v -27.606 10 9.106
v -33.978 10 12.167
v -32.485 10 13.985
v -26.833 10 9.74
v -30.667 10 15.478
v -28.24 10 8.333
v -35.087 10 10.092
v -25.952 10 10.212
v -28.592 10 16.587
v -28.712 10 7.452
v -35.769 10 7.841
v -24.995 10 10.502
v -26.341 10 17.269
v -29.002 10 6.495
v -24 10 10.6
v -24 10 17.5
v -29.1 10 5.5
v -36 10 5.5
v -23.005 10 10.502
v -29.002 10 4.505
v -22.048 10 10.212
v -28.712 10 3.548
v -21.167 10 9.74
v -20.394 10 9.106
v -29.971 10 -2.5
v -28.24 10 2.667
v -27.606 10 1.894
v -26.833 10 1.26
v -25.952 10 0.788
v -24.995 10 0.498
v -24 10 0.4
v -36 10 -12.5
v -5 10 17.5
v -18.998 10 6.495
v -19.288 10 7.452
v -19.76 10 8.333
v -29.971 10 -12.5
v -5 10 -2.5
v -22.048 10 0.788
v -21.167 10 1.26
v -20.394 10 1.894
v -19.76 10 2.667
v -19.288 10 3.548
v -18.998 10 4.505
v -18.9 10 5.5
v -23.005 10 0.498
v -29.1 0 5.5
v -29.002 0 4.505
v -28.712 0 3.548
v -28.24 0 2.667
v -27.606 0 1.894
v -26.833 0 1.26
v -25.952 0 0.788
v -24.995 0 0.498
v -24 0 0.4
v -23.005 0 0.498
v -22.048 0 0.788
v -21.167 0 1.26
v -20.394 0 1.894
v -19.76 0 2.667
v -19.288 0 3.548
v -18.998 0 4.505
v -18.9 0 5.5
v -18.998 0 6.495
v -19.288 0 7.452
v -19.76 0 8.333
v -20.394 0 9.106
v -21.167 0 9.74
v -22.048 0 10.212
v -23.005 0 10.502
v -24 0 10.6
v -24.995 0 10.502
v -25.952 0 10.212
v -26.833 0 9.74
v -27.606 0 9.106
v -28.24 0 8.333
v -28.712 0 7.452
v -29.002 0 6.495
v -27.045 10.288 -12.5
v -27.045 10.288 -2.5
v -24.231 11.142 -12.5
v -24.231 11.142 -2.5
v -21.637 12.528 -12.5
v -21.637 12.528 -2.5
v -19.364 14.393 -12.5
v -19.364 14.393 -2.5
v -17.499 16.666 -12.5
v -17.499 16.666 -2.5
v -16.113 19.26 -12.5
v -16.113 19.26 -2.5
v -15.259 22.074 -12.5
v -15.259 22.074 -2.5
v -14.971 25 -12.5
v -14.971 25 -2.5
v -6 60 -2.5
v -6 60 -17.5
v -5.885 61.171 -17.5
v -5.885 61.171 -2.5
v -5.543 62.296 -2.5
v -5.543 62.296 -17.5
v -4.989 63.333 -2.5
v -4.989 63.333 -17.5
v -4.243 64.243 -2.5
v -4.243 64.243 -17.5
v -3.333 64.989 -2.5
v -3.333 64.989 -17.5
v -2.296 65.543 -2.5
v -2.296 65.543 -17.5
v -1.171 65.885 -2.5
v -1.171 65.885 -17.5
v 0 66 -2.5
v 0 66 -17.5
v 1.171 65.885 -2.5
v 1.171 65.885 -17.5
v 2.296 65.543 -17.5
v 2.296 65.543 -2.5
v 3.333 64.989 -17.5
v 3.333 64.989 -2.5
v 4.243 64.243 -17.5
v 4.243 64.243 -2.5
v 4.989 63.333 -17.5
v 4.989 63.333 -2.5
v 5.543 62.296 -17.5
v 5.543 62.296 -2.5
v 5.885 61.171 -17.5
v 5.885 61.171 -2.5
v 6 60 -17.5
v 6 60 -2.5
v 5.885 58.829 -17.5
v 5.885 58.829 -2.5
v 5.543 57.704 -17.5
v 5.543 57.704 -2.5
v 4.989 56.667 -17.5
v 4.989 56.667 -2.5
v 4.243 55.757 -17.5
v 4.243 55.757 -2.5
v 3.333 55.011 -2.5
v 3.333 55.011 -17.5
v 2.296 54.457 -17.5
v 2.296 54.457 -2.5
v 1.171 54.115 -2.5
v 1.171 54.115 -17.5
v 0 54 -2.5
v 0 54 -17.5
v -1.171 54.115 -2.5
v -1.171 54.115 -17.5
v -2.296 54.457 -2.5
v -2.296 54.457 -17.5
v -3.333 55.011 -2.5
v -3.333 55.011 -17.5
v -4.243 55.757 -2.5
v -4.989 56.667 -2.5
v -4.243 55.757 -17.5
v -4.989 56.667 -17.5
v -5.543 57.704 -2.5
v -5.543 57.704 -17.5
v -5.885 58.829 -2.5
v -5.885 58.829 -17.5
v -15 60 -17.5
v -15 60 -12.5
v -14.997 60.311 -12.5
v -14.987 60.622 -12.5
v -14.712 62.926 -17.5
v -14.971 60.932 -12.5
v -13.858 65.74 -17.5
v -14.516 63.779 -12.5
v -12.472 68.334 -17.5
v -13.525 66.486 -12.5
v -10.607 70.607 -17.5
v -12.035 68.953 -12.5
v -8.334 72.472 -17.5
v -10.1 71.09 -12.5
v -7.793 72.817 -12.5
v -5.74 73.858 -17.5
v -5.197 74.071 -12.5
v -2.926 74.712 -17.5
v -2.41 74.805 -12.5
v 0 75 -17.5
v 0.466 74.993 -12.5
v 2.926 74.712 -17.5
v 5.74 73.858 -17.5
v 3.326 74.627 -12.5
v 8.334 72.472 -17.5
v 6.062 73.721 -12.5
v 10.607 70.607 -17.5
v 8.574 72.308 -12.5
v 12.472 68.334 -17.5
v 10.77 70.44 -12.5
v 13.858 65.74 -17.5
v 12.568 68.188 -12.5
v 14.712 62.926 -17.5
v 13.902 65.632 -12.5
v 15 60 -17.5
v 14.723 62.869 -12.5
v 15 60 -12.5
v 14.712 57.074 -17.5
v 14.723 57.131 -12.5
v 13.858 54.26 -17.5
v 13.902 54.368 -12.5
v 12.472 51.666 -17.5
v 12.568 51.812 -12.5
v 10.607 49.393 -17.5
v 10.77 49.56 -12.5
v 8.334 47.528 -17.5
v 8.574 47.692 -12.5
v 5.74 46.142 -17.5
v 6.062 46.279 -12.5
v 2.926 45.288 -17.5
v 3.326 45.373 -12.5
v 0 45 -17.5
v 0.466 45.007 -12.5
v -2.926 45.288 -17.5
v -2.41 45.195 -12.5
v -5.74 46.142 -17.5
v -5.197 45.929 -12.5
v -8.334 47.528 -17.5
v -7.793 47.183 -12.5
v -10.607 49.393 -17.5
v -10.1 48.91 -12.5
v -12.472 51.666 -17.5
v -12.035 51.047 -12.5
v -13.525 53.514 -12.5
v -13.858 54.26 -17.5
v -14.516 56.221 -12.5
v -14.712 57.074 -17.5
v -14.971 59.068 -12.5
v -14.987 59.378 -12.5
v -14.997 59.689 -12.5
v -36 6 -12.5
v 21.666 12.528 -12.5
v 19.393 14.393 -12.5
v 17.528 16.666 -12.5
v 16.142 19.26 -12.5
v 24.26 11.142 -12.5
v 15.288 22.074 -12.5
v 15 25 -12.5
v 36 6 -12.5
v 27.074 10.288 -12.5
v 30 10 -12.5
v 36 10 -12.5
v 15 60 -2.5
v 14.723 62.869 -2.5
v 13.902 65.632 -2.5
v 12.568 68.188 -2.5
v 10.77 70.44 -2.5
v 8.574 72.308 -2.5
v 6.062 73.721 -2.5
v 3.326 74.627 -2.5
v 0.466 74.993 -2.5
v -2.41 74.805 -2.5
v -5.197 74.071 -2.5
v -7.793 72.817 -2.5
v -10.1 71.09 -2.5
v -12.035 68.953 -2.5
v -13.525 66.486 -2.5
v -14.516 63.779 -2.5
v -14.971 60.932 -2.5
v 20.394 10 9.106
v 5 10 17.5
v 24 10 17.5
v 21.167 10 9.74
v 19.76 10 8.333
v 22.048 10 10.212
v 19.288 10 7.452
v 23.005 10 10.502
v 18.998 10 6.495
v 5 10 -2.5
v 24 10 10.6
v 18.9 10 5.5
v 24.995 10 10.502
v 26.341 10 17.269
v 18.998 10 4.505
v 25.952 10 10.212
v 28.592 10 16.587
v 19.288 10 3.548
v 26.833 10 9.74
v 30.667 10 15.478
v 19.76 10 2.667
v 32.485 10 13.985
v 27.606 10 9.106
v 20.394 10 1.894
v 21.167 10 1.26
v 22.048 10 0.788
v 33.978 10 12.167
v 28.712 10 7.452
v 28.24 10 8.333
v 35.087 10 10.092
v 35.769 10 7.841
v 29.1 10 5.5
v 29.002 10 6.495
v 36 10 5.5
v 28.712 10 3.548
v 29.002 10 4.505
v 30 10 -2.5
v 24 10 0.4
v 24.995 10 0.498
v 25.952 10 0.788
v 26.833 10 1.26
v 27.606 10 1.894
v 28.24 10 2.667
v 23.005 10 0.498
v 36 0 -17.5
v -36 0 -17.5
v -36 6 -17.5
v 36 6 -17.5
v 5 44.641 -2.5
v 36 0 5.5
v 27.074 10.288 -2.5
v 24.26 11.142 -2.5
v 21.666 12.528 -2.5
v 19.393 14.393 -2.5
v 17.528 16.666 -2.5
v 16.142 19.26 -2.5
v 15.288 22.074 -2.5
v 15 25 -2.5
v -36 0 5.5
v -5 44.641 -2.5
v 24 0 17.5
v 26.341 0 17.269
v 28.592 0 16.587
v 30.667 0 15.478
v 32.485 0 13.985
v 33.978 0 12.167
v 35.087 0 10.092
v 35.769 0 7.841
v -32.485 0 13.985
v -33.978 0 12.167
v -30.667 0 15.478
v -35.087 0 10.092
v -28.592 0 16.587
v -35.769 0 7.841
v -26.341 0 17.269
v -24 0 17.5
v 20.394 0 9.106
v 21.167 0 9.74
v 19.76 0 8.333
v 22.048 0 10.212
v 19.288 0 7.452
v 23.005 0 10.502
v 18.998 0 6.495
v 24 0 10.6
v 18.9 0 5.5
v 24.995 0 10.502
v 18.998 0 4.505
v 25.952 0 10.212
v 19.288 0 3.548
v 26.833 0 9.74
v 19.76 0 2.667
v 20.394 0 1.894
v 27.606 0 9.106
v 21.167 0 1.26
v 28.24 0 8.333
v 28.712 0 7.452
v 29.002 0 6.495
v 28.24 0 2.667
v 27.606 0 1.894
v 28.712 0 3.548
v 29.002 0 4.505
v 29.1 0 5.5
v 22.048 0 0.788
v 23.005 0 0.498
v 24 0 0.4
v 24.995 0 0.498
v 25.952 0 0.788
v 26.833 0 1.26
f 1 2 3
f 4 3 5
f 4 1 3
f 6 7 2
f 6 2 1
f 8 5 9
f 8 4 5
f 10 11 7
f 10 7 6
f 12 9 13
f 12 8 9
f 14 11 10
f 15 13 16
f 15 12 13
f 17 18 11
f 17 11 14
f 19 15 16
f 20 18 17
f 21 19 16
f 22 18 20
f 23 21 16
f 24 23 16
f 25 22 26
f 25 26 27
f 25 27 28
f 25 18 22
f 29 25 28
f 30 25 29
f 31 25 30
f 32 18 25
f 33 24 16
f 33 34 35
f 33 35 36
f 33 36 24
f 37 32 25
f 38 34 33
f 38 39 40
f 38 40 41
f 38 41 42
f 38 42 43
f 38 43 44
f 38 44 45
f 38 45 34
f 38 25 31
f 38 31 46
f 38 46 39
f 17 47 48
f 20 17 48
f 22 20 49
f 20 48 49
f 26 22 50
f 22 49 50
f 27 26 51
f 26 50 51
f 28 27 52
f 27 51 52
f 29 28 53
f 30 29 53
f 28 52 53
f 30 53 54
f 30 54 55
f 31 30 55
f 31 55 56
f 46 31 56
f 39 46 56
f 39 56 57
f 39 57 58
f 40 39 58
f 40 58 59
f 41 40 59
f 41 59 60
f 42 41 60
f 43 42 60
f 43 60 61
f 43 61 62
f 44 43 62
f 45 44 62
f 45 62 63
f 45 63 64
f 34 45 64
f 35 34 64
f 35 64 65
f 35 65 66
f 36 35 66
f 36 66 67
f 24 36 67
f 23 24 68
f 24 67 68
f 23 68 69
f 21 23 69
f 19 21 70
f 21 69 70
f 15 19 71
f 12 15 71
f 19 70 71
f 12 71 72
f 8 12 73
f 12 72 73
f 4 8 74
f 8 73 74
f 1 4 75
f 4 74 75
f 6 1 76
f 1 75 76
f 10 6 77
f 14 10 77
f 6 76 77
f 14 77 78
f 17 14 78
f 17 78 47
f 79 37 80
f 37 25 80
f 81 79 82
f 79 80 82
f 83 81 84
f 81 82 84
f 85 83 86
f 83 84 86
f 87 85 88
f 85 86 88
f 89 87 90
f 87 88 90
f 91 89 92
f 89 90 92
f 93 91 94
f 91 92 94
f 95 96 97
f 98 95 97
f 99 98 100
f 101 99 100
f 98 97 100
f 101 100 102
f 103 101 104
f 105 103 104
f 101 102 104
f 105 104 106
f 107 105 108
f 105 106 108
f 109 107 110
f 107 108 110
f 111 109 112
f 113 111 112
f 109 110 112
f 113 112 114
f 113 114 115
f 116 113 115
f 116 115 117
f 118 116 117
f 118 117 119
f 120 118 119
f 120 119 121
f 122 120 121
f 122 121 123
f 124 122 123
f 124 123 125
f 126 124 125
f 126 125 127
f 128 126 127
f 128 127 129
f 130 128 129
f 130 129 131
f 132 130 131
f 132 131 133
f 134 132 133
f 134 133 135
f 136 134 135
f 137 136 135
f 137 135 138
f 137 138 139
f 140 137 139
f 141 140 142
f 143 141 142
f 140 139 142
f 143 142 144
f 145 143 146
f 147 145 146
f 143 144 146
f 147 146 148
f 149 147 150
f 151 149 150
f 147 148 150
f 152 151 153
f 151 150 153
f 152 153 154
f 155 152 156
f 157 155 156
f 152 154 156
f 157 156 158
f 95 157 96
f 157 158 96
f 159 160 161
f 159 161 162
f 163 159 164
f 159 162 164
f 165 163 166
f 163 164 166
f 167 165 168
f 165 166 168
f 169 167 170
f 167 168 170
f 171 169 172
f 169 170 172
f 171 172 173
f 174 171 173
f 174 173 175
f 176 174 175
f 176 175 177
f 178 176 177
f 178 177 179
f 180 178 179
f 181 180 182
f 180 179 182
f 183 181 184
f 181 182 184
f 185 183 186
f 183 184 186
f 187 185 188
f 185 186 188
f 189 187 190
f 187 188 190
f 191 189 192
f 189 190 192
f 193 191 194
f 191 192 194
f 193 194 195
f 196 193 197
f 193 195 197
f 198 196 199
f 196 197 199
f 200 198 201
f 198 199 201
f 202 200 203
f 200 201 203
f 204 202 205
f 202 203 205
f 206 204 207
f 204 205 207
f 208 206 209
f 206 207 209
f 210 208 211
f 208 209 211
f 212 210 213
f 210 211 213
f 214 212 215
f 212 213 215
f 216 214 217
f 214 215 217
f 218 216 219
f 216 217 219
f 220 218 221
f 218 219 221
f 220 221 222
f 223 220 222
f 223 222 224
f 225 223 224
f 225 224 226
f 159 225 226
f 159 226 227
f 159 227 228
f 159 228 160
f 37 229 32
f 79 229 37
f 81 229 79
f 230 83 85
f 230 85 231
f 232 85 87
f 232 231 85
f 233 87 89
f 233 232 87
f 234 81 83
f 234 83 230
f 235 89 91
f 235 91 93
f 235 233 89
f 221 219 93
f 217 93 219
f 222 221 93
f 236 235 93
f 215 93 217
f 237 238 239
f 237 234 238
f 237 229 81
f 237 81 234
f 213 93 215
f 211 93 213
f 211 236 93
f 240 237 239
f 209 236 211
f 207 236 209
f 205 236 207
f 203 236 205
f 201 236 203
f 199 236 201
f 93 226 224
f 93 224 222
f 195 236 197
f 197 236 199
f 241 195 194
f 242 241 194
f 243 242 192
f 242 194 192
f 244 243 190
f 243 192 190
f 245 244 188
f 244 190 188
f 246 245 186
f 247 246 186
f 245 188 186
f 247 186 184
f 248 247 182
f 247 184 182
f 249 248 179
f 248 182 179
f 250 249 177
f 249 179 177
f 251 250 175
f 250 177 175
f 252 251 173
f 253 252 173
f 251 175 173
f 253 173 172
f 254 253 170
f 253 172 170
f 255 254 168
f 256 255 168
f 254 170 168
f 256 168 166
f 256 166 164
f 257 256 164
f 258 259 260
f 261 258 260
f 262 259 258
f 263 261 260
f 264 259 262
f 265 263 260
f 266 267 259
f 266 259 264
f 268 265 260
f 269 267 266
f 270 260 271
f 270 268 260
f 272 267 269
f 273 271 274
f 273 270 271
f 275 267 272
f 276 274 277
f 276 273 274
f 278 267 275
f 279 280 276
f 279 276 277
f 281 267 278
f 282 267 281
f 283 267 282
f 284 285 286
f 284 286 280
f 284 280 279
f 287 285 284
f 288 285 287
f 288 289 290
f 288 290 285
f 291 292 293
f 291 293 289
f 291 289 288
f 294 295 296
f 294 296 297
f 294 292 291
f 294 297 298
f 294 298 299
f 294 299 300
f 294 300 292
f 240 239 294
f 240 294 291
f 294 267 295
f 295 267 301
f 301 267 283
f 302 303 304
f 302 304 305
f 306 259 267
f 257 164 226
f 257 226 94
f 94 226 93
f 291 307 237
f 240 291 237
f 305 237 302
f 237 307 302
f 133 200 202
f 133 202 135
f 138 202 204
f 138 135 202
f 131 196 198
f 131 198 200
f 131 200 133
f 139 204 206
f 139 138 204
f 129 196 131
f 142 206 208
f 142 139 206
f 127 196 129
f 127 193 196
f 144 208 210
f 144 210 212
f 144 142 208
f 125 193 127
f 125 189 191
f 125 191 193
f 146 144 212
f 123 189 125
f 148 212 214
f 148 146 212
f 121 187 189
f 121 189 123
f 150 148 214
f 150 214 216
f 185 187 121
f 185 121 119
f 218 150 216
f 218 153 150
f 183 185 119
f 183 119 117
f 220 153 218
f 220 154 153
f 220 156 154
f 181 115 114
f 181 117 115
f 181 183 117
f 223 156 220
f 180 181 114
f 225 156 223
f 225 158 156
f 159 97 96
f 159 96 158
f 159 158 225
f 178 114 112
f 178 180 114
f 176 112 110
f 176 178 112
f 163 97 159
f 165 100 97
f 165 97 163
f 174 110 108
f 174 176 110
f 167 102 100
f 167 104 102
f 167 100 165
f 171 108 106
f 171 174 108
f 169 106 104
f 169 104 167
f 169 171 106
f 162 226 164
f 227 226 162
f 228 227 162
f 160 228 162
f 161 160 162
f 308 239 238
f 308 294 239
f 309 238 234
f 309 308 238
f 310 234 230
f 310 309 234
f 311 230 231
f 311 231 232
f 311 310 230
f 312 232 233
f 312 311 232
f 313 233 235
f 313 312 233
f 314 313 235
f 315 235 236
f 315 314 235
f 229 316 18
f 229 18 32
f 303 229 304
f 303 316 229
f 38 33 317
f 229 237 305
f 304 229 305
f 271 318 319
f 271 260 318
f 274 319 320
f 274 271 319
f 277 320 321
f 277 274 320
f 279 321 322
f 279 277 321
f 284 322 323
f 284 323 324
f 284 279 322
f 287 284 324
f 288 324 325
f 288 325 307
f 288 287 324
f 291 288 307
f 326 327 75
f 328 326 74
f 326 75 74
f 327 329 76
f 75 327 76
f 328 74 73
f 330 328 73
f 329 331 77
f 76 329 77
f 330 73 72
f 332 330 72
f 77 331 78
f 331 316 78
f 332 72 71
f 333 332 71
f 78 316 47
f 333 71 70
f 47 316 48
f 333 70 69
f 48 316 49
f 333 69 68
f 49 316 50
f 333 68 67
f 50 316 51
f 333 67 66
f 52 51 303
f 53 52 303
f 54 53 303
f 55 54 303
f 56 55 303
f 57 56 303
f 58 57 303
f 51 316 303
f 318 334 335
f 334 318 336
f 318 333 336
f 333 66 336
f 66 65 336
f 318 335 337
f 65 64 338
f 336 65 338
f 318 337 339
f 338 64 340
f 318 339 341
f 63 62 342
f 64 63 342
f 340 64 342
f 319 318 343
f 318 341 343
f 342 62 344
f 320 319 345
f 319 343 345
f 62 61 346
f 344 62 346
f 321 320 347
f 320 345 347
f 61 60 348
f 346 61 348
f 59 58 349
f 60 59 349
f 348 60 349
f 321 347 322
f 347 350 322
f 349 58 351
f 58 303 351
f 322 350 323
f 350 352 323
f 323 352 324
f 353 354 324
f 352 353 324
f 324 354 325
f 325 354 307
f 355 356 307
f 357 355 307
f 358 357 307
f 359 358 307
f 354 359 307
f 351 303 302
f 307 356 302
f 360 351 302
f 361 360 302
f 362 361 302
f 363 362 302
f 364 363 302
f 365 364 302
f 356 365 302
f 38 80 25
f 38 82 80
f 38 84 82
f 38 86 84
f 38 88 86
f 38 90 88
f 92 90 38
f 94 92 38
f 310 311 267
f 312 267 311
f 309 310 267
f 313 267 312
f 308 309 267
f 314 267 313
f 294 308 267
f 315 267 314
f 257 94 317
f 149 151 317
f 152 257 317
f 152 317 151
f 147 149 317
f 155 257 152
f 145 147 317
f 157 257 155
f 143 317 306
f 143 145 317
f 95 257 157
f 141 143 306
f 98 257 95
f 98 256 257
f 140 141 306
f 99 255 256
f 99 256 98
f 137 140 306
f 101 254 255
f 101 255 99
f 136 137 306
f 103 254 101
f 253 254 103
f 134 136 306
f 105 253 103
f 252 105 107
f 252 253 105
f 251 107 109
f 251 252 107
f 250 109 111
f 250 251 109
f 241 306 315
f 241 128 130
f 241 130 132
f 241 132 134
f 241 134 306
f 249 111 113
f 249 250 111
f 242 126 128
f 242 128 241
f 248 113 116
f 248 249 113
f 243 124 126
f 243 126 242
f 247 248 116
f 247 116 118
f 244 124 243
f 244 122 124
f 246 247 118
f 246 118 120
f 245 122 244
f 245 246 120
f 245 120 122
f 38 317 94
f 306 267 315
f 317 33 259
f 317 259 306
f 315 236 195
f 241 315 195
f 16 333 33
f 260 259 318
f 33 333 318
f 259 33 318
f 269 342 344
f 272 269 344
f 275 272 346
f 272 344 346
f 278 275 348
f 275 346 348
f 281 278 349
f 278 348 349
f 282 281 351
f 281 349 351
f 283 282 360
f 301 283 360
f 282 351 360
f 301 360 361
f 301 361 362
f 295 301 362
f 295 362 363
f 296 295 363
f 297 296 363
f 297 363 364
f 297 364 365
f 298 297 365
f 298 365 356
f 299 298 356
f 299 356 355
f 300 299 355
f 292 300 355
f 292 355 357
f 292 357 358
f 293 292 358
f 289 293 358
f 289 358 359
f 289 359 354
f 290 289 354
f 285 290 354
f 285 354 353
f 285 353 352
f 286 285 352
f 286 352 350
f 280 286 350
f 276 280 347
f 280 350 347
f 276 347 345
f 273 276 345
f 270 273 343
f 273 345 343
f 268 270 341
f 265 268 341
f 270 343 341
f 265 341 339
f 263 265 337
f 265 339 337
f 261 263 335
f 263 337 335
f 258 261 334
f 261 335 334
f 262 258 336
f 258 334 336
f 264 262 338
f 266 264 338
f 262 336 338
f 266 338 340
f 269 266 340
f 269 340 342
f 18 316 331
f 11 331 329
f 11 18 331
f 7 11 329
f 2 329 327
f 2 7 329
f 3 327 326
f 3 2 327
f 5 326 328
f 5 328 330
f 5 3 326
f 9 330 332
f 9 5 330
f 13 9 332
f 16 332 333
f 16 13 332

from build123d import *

# Parameters (mm, degrees)
SKETCH1_W           = 72
SKETCH1_H           = 35
BOSS_EXTRUDE1_DEPTH = 10
FILLET1_R           = 12
SKETCH3_W           = 5
SKETCH3_H           = 4
CUT_EXTRUDE1_DEPTH  = 89
SKETCH6_R           = 6
BOSS_EXTRUDE2_DEPTH = 10
FILLET2_R           = 15
M12_TAPPED_HOLE1_D  = 10.2
SKETCH11_R          = 15
BOSS_EXTRUDE5_DEPTH = 5
SKETCH18_R          = 6
CUT_EXTRUDE2_DEPTH  = 91.255193756
RIB1_REACH          = 87.013
SKETCH19_WALL_W     = 212.026468528
SKETCH19_WALL_H     = 10


with BuildPart() as part:
    # Sketch1 → Boss-Extrude1 (new body)
    with BuildSketch(Plane(origin=(0, 0, 0), x_dir=(1, 0, 0), z_dir=(0, 1, 0))):
        Rectangle(SKETCH1_W, SKETCH1_H)
    extrude(amount=BOSS_EXTRUDE1_DEPTH)

    # Fillet1
    fillet1_edges = [part.edges().sort_by_distance(p)[0] for p in [
        (36, 5, 17.5),
        (-36, 5, 17.5),
    ]]
    fillet(fillet1_edges, radius=FILLET1_R)

    # Sketch3 → Cut-Extrude1 (cut)
    with BuildSketch(Plane(origin=(36, 0, 0), x_dir=(0, 0, -1), z_dir=(1, 0, 0))):
        with Locations((15, 8)):
            Rectangle(SKETCH3_W, SKETCH3_H)
    extrude(amount=-CUT_EXTRUDE1_DEPTH, mode=Mode.SUBTRACT)

    # Sketch6 → Boss-Extrude2 (add)
    with BuildSketch(Plane(origin=(0, 0, -12.5), x_dir=(-1, 0, 0), z_dir=(0, 0, -1))):
        with BuildLine():
            Line((14.970991041, 10), (-15, 10))
            Line((-15, 10), (-15, 60))
            ThreePointArc((-15, 60), (-0.466440987, 74.992746006), (14.970991041, 60.932430832))
            Line((14.970991041, 60.932430832), (14.970991041, 10))
        make_face()
        with Locations((0, 60)):
            Circle(SKETCH6_R, mode=Mode.SUBTRACT)
    extrude(amount=-BOSS_EXTRUDE2_DEPTH)

    # Fillet2
    fillet2_edges = [part.edges().sort_by_distance(p)[0] for p in [
        (-14.970991041, 10, -7.5),
        (15, 10, -7.5),
    ]]
    fillet(fillet2_edges, radius=FILLET2_R)

    # M12 Tapped Hole1 (through all)
    with Locations(Plane(origin=(0, 10, 0), x_dir=(1, 0, 0), z_dir=(0, 1, 0))):
        with Locations((24, -5.5), (-24, -5.5)):
            Hole(M12_TAPPED_HOLE1_D / 2)

    # Sketch11 → Boss-Extrude5 (add)
    with BuildSketch(Plane(origin=(0, 0, -12.5), x_dir=(-1, 0, 0), z_dir=(0, 0, -1))):
        with Locations((0, 60)):
            Circle(SKETCH11_R)
    extrude(amount=BOSS_EXTRUDE5_DEPTH)

    # Sketch18 → Cut-Extrude2 (cut, through all)
    with BuildSketch(Plane(origin=(0, 0, -17.5), x_dir=(-1, 0, 0), z_dir=(0, 0, -1))):
        with Locations((0, 60)):
            Circle(SKETCH18_R)
    extrude(amount=-CUT_EXTRUDE2_DEPTH, mode=Mode.SUBTRACT)

    # Sketch19 wall → Rib1 (add, up to next)
    with BuildSketch(Plane(origin=(0, 27.320508076, 7.5), x_dir=(0, 0.866025403782, -0.500000000004), z_dir=(0, 0.500000000004, 0.866025403782)), mode=Mode.PRIVATE) as rib1_sk1:
        Rectangle(SKETCH19_WALL_W, SKETCH19_WALL_H)
    rib1_tool1 = extrude(rib1_sk1.sketch, amount=-RIB1_REACH, mode=Mode.PRIVATE) - part.part
    add(rib1_tool1.solids().sort_by_distance((0, 27.320508076, 7.5))[0])


solid = part.part
